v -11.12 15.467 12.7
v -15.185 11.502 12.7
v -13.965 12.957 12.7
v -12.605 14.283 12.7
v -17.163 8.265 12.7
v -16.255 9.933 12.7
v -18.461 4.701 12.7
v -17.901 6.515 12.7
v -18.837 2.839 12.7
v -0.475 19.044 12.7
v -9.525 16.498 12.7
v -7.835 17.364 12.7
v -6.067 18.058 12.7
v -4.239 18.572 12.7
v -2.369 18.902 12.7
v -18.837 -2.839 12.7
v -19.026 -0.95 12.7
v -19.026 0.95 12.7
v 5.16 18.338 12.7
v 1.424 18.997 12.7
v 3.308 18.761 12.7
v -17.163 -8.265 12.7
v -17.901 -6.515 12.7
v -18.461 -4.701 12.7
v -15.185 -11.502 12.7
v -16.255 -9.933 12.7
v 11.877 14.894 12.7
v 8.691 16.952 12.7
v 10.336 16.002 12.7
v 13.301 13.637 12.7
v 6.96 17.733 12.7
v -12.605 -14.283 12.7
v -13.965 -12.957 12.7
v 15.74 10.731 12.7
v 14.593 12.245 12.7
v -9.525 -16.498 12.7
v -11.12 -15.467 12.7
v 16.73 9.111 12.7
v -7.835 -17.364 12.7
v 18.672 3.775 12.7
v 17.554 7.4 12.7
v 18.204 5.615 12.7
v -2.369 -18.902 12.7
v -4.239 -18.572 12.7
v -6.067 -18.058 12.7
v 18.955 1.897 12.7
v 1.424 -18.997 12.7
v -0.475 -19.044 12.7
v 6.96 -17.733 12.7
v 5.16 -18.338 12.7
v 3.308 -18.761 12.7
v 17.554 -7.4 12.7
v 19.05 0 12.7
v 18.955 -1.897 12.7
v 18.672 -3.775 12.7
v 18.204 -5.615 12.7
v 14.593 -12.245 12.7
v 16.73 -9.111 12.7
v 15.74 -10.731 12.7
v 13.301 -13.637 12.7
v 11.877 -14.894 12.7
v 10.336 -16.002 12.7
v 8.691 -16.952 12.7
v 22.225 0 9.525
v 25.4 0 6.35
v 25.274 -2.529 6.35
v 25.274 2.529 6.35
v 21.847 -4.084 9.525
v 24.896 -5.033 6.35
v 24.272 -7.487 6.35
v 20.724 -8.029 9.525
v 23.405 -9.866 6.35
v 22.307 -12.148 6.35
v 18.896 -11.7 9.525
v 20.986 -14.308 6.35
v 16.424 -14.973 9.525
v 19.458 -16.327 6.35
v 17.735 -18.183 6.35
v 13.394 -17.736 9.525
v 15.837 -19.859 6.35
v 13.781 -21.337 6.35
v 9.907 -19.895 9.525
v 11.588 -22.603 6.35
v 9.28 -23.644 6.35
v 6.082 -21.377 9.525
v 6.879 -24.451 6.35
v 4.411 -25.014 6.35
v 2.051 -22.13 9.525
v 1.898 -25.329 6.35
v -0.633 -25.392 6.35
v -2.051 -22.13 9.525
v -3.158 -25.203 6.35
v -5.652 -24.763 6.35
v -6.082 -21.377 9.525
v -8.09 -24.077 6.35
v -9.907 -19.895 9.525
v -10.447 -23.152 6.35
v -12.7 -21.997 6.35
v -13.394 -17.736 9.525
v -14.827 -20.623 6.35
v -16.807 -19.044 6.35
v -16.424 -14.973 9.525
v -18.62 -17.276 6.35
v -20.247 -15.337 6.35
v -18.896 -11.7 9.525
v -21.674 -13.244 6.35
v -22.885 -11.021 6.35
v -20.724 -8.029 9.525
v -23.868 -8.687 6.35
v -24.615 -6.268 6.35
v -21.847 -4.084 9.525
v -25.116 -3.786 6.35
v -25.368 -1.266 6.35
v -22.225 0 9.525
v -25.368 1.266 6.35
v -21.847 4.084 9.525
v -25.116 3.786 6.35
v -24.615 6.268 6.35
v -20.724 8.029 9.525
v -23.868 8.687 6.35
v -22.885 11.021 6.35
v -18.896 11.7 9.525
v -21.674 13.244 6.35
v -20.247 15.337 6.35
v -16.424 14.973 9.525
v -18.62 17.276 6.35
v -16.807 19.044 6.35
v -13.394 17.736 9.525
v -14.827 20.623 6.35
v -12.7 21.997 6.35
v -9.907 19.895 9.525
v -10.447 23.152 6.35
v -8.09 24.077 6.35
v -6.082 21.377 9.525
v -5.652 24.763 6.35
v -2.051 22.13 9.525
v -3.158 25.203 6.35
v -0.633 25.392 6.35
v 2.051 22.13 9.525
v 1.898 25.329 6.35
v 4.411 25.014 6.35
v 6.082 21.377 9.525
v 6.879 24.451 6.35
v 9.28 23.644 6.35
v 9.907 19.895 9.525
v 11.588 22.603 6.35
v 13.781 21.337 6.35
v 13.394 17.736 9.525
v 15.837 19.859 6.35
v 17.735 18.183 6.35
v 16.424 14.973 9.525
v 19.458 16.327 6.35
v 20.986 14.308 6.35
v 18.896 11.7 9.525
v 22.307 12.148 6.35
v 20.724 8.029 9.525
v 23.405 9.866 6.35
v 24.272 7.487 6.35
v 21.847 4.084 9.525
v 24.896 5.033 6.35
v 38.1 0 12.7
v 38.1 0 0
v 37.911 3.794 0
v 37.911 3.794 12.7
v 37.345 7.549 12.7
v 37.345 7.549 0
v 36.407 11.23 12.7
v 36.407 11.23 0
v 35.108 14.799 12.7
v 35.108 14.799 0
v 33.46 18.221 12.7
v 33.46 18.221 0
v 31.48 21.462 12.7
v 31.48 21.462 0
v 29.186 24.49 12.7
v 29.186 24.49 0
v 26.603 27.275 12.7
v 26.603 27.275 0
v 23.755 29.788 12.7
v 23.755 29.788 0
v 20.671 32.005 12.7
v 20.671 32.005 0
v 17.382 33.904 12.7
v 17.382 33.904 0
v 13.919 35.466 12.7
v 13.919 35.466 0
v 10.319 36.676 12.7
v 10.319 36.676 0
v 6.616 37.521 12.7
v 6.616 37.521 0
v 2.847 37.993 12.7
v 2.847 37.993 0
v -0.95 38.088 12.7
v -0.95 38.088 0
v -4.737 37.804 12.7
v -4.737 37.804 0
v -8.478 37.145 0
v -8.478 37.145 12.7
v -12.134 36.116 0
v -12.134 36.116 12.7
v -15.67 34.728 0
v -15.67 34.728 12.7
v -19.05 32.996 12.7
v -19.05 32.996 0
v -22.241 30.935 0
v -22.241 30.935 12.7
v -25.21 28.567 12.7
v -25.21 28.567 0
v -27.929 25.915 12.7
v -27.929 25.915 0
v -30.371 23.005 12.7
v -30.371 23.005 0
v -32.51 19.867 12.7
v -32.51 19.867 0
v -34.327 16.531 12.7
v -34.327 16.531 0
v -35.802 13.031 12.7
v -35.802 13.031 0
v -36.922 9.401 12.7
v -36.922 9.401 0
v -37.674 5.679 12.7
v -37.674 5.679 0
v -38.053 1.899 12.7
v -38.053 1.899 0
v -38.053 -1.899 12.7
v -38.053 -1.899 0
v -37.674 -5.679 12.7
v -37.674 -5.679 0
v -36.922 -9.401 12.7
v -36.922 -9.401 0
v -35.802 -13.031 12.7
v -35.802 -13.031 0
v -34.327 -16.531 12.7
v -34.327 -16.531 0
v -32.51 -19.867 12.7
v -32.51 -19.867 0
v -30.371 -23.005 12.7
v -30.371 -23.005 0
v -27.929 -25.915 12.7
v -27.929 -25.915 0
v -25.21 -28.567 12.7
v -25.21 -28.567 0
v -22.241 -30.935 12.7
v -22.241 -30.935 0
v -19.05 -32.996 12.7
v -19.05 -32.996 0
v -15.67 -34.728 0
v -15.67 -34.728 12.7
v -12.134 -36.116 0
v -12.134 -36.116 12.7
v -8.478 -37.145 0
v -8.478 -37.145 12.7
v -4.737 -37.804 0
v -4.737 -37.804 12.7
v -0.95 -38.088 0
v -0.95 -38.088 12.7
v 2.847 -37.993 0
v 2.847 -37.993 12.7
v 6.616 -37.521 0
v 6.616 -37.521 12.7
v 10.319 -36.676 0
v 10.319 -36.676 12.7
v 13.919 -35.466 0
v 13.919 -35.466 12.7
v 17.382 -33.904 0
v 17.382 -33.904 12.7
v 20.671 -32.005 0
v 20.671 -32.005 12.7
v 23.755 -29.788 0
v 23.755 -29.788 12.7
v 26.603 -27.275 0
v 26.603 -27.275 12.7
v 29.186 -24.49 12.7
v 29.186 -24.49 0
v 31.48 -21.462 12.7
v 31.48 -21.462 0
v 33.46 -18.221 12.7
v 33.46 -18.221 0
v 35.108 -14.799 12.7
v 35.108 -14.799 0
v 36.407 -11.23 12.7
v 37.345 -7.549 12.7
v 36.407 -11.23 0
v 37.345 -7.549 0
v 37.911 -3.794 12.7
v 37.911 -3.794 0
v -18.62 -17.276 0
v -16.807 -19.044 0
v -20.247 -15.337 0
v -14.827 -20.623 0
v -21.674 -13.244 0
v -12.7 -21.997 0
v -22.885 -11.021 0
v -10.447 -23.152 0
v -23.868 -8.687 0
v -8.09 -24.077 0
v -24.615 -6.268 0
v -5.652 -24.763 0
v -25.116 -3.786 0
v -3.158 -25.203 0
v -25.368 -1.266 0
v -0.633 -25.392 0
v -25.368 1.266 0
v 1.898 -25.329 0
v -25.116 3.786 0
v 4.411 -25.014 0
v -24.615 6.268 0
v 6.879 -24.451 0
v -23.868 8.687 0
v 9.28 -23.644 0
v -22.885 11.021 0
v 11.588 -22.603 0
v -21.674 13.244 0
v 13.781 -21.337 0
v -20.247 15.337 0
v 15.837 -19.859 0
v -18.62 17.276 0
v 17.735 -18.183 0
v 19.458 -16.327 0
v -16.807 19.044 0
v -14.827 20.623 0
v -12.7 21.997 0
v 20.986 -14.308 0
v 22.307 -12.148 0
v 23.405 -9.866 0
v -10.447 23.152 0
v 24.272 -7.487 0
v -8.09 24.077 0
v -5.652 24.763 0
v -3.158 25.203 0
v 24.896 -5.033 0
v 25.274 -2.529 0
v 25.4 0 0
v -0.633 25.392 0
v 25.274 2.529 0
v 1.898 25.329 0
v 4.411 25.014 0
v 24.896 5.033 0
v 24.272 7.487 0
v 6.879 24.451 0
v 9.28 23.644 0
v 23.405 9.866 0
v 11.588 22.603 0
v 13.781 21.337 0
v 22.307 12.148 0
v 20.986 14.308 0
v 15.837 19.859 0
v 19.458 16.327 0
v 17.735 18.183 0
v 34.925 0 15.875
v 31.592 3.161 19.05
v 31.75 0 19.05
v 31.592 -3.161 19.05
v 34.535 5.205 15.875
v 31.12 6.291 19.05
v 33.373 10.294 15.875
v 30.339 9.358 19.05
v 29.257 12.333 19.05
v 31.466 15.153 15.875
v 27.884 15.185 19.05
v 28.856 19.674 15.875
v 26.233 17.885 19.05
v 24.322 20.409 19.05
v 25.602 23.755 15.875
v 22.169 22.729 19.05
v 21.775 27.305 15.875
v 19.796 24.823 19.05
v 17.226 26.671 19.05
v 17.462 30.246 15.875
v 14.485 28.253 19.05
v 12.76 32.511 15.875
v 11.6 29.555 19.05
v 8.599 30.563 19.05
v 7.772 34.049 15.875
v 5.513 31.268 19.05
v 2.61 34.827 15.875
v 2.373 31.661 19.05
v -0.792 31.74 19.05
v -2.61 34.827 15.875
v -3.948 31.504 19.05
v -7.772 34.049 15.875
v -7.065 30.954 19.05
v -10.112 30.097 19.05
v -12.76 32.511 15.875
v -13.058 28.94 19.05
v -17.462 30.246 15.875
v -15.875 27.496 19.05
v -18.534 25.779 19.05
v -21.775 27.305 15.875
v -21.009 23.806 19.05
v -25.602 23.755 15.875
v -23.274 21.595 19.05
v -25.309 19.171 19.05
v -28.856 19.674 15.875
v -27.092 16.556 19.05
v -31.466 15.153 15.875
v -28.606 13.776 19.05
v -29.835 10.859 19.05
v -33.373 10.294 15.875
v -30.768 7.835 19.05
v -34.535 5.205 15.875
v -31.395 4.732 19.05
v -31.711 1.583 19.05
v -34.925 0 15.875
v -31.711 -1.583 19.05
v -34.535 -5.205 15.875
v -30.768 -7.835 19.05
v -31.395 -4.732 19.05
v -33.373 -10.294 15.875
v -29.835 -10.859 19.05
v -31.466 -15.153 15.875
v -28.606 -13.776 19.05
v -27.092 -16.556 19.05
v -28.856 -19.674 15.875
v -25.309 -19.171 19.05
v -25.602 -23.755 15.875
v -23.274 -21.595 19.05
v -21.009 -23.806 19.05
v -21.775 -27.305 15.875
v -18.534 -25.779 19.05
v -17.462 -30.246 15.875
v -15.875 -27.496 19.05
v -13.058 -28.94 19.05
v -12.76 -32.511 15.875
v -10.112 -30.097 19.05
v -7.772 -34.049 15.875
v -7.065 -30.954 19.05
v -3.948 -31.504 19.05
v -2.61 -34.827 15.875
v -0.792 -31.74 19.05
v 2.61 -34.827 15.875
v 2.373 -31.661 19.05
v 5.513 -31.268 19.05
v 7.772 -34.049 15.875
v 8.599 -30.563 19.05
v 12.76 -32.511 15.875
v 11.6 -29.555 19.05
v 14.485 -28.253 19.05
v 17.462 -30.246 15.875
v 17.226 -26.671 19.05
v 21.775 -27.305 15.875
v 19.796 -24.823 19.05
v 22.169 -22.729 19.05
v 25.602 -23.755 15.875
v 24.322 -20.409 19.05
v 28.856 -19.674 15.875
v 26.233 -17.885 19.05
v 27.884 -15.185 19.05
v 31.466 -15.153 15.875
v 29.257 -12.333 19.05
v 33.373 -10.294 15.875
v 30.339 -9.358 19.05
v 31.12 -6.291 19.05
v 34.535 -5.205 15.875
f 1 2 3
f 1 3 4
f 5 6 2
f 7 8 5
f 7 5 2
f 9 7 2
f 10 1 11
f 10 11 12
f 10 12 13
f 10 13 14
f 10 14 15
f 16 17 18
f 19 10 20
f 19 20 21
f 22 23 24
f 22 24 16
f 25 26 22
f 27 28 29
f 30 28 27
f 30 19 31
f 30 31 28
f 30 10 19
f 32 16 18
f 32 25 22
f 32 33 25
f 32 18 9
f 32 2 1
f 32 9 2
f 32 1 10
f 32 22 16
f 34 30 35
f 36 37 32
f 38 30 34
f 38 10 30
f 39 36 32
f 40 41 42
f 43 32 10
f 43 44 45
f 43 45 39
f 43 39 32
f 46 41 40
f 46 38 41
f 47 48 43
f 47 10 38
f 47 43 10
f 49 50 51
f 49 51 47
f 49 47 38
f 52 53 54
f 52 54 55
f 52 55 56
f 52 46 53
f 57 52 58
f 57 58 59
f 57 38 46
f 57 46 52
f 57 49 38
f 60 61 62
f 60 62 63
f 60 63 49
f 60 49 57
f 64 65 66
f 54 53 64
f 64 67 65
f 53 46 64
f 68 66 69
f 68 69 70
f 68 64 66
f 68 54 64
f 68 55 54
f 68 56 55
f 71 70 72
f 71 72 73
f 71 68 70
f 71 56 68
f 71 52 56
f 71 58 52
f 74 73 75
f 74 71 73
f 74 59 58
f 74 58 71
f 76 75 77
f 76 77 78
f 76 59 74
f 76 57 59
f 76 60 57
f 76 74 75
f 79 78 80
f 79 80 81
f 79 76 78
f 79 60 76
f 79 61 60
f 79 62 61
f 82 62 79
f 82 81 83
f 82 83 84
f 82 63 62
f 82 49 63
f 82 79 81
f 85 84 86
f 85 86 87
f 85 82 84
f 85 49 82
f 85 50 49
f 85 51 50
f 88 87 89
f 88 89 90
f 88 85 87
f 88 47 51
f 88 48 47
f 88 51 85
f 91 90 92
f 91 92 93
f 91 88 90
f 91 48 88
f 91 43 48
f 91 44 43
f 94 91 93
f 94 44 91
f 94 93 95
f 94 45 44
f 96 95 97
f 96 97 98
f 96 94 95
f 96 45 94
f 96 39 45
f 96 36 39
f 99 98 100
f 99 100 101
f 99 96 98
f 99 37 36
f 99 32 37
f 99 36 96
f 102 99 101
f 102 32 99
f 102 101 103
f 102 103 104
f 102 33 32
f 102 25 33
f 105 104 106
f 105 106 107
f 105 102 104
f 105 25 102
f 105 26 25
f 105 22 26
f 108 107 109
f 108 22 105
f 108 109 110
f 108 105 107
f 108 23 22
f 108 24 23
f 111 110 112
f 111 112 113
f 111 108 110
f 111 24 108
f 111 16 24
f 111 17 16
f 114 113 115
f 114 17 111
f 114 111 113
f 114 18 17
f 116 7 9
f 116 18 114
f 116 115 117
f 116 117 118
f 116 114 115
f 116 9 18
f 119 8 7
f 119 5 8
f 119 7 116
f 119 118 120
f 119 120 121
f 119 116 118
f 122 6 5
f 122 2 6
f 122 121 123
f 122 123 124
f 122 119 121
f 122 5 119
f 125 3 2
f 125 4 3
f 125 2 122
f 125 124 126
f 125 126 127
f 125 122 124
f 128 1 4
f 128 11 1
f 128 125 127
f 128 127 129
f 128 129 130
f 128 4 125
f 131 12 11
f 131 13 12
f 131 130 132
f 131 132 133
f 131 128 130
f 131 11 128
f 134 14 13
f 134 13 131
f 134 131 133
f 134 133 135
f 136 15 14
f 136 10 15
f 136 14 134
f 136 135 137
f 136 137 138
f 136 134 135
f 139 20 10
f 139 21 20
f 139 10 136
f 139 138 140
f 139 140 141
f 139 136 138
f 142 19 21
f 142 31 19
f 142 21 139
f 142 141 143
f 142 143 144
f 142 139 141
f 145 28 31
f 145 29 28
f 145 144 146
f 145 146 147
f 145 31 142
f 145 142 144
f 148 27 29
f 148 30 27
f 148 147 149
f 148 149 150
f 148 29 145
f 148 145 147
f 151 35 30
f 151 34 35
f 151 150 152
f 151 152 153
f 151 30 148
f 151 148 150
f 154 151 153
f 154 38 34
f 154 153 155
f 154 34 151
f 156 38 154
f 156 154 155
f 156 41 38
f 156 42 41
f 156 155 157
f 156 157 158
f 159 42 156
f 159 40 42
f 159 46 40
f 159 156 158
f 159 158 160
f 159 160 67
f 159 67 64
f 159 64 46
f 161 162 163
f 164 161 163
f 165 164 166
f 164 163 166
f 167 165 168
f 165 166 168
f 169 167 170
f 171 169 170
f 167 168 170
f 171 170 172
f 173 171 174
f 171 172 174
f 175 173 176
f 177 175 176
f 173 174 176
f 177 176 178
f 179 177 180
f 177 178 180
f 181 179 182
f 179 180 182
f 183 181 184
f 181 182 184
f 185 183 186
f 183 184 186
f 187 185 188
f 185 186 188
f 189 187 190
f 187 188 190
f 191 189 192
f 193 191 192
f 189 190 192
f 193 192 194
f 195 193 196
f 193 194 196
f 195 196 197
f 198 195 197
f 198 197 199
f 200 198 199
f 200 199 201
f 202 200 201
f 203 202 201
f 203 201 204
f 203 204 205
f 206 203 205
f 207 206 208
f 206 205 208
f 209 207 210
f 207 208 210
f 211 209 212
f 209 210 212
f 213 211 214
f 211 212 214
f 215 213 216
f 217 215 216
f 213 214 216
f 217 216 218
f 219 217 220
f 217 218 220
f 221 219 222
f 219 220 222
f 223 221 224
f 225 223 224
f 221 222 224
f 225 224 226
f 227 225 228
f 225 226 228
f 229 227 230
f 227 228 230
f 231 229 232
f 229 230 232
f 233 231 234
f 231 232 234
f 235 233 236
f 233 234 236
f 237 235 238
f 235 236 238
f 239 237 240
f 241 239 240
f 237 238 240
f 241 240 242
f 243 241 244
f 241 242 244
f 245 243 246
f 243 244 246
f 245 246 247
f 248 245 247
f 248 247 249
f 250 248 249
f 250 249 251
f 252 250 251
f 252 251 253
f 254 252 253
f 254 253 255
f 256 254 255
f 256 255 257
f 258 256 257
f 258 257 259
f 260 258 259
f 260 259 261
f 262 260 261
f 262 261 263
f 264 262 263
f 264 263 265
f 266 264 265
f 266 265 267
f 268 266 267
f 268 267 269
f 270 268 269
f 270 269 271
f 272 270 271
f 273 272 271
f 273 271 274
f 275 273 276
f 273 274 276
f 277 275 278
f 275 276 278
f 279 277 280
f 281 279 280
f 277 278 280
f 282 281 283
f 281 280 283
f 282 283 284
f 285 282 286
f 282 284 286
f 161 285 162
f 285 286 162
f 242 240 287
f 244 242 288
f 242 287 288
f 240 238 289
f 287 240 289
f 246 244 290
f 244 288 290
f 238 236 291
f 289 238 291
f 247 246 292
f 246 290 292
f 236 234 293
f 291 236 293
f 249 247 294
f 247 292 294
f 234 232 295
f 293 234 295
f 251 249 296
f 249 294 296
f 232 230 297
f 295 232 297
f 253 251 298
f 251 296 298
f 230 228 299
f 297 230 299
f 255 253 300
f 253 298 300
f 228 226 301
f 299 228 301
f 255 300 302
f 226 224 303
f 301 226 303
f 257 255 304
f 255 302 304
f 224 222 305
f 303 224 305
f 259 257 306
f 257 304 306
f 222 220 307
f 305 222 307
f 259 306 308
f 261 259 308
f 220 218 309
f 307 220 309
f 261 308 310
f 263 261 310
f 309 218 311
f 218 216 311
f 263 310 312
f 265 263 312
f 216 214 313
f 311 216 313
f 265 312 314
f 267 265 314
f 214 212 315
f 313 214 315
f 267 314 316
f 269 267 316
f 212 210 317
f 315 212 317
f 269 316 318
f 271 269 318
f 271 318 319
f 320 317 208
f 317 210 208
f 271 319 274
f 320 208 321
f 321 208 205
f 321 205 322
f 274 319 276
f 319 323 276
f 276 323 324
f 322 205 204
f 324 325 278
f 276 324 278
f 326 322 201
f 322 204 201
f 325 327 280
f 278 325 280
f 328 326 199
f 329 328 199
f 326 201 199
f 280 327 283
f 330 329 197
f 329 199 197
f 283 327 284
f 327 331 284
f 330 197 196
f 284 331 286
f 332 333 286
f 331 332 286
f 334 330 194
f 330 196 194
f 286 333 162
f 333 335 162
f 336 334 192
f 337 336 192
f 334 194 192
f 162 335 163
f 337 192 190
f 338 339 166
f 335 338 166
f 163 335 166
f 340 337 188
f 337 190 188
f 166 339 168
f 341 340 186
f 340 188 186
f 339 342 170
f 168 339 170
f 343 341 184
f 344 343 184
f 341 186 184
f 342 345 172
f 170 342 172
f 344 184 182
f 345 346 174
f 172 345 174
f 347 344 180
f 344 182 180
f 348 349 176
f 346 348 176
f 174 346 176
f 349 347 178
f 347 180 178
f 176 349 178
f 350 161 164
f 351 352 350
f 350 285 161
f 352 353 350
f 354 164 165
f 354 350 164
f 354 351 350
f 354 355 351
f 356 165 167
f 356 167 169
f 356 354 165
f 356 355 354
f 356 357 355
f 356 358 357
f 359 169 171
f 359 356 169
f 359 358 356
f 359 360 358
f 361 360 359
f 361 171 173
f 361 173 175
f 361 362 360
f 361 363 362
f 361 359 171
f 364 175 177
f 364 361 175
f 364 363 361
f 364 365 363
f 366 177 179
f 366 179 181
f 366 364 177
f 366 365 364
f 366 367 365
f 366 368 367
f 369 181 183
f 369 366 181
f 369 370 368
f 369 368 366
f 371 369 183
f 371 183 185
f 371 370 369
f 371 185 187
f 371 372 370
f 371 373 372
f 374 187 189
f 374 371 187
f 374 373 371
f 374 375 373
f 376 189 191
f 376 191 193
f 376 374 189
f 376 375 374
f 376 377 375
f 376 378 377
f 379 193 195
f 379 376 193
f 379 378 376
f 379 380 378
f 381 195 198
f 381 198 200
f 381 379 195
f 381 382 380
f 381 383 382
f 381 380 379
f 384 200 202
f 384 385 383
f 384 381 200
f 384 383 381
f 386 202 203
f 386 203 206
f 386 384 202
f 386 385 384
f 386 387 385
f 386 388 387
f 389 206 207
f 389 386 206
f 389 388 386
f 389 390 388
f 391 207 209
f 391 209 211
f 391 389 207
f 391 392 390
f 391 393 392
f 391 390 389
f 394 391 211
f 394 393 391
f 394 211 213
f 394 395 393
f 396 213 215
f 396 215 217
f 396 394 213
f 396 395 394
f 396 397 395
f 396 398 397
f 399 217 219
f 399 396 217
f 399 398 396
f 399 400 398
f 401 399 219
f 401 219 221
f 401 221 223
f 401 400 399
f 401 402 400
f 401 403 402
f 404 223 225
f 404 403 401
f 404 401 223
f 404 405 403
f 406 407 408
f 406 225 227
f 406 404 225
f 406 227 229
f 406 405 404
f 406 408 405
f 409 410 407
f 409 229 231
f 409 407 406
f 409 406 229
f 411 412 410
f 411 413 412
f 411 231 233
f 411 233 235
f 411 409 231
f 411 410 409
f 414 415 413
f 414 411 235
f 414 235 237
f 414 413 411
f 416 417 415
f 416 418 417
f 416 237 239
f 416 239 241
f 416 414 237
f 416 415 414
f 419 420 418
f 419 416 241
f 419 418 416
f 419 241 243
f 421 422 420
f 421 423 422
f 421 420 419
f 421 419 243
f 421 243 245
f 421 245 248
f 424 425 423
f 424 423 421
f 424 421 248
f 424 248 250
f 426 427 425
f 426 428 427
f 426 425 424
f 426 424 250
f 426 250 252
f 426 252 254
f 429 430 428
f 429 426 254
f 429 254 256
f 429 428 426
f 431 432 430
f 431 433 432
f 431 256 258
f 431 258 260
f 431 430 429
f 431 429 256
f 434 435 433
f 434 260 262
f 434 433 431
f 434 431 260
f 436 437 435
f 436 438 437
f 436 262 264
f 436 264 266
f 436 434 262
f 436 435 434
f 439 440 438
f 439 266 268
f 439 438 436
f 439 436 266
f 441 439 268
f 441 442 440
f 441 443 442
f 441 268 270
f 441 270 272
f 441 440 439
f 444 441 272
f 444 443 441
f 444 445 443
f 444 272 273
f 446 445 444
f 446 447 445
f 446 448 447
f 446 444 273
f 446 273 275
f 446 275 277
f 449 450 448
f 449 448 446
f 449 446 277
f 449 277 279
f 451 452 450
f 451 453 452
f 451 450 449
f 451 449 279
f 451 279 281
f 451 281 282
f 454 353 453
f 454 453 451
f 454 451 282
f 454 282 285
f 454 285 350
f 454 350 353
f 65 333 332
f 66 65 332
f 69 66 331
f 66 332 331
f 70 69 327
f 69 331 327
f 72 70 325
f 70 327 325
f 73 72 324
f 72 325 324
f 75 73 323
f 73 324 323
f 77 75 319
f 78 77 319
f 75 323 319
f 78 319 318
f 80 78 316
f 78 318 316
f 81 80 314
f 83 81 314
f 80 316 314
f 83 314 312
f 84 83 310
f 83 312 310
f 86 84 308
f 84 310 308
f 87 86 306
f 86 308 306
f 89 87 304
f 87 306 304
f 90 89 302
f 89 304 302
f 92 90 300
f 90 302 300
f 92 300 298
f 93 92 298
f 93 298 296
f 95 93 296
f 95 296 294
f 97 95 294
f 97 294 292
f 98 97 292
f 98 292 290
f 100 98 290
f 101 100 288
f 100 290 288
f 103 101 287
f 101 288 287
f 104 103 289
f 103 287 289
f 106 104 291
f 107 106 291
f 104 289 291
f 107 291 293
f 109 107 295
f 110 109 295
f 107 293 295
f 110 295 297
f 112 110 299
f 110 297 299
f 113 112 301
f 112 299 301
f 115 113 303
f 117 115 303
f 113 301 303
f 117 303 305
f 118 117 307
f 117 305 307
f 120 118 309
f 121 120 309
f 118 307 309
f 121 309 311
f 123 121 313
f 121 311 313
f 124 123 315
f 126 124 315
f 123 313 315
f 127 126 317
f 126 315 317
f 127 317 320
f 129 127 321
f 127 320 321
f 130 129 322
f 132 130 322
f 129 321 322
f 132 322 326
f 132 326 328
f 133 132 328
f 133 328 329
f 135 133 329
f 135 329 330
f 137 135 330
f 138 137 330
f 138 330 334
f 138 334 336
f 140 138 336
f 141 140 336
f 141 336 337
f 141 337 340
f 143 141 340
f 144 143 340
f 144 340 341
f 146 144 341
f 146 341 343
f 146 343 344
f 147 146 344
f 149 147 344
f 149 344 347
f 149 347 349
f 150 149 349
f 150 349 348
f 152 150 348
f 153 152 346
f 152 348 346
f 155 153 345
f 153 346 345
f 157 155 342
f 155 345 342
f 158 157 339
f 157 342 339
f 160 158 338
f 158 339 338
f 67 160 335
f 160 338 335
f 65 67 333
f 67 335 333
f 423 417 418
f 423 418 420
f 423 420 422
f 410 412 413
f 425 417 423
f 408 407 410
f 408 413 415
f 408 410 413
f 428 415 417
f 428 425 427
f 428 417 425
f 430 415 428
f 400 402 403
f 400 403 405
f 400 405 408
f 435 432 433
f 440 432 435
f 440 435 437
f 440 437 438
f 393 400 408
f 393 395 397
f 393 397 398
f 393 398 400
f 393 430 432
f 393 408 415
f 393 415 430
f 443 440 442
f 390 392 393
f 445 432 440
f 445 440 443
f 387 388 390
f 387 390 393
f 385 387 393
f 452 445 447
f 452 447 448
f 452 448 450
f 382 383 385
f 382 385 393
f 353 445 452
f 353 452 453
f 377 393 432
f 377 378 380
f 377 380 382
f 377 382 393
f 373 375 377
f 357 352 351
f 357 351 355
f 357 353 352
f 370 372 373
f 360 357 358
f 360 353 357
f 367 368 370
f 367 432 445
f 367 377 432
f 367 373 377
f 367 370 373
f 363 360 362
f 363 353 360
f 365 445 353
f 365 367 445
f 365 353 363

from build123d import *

# Parameters (mm, degrees)
F0_R     = 38.1
F1_DEPTH = 19.05
F2_SIZE  = 6.35
F3_R     = 25.4
F4_DEPTH = 12.7
F5_SIZE  = 6.35


with BuildPart() as f1:
    # F0 (on Top) → F1 (new body)
    with BuildSketch(Plane.XY):
        Circle(F0_R)
    extrude(amount=F1_DEPTH)

    # F2
    f2_edges = [f1.edges().sort_by_distance(p)[0] for p in [
        (-38.1, 0, 19.05),
    ]]
    chamfer(f2_edges, length=F2_SIZE)

    # F3 (on face) → F4 (cut)
    with BuildSketch(Plane(origin=(0, 0, 0), x_dir=(1, 0, 0), z_dir=(0, 0, -1))):
        Circle(F3_R)
    extrude(amount=-F4_DEPTH, mode=Mode.SUBTRACT)

    # F5
    f5_edges = [f1.edges().sort_by_distance(p)[0] for p in [
        (-25.4, 0, 12.7),
    ]]
    chamfer(f5_edges, length=F5_SIZE)


solid = f1.part
